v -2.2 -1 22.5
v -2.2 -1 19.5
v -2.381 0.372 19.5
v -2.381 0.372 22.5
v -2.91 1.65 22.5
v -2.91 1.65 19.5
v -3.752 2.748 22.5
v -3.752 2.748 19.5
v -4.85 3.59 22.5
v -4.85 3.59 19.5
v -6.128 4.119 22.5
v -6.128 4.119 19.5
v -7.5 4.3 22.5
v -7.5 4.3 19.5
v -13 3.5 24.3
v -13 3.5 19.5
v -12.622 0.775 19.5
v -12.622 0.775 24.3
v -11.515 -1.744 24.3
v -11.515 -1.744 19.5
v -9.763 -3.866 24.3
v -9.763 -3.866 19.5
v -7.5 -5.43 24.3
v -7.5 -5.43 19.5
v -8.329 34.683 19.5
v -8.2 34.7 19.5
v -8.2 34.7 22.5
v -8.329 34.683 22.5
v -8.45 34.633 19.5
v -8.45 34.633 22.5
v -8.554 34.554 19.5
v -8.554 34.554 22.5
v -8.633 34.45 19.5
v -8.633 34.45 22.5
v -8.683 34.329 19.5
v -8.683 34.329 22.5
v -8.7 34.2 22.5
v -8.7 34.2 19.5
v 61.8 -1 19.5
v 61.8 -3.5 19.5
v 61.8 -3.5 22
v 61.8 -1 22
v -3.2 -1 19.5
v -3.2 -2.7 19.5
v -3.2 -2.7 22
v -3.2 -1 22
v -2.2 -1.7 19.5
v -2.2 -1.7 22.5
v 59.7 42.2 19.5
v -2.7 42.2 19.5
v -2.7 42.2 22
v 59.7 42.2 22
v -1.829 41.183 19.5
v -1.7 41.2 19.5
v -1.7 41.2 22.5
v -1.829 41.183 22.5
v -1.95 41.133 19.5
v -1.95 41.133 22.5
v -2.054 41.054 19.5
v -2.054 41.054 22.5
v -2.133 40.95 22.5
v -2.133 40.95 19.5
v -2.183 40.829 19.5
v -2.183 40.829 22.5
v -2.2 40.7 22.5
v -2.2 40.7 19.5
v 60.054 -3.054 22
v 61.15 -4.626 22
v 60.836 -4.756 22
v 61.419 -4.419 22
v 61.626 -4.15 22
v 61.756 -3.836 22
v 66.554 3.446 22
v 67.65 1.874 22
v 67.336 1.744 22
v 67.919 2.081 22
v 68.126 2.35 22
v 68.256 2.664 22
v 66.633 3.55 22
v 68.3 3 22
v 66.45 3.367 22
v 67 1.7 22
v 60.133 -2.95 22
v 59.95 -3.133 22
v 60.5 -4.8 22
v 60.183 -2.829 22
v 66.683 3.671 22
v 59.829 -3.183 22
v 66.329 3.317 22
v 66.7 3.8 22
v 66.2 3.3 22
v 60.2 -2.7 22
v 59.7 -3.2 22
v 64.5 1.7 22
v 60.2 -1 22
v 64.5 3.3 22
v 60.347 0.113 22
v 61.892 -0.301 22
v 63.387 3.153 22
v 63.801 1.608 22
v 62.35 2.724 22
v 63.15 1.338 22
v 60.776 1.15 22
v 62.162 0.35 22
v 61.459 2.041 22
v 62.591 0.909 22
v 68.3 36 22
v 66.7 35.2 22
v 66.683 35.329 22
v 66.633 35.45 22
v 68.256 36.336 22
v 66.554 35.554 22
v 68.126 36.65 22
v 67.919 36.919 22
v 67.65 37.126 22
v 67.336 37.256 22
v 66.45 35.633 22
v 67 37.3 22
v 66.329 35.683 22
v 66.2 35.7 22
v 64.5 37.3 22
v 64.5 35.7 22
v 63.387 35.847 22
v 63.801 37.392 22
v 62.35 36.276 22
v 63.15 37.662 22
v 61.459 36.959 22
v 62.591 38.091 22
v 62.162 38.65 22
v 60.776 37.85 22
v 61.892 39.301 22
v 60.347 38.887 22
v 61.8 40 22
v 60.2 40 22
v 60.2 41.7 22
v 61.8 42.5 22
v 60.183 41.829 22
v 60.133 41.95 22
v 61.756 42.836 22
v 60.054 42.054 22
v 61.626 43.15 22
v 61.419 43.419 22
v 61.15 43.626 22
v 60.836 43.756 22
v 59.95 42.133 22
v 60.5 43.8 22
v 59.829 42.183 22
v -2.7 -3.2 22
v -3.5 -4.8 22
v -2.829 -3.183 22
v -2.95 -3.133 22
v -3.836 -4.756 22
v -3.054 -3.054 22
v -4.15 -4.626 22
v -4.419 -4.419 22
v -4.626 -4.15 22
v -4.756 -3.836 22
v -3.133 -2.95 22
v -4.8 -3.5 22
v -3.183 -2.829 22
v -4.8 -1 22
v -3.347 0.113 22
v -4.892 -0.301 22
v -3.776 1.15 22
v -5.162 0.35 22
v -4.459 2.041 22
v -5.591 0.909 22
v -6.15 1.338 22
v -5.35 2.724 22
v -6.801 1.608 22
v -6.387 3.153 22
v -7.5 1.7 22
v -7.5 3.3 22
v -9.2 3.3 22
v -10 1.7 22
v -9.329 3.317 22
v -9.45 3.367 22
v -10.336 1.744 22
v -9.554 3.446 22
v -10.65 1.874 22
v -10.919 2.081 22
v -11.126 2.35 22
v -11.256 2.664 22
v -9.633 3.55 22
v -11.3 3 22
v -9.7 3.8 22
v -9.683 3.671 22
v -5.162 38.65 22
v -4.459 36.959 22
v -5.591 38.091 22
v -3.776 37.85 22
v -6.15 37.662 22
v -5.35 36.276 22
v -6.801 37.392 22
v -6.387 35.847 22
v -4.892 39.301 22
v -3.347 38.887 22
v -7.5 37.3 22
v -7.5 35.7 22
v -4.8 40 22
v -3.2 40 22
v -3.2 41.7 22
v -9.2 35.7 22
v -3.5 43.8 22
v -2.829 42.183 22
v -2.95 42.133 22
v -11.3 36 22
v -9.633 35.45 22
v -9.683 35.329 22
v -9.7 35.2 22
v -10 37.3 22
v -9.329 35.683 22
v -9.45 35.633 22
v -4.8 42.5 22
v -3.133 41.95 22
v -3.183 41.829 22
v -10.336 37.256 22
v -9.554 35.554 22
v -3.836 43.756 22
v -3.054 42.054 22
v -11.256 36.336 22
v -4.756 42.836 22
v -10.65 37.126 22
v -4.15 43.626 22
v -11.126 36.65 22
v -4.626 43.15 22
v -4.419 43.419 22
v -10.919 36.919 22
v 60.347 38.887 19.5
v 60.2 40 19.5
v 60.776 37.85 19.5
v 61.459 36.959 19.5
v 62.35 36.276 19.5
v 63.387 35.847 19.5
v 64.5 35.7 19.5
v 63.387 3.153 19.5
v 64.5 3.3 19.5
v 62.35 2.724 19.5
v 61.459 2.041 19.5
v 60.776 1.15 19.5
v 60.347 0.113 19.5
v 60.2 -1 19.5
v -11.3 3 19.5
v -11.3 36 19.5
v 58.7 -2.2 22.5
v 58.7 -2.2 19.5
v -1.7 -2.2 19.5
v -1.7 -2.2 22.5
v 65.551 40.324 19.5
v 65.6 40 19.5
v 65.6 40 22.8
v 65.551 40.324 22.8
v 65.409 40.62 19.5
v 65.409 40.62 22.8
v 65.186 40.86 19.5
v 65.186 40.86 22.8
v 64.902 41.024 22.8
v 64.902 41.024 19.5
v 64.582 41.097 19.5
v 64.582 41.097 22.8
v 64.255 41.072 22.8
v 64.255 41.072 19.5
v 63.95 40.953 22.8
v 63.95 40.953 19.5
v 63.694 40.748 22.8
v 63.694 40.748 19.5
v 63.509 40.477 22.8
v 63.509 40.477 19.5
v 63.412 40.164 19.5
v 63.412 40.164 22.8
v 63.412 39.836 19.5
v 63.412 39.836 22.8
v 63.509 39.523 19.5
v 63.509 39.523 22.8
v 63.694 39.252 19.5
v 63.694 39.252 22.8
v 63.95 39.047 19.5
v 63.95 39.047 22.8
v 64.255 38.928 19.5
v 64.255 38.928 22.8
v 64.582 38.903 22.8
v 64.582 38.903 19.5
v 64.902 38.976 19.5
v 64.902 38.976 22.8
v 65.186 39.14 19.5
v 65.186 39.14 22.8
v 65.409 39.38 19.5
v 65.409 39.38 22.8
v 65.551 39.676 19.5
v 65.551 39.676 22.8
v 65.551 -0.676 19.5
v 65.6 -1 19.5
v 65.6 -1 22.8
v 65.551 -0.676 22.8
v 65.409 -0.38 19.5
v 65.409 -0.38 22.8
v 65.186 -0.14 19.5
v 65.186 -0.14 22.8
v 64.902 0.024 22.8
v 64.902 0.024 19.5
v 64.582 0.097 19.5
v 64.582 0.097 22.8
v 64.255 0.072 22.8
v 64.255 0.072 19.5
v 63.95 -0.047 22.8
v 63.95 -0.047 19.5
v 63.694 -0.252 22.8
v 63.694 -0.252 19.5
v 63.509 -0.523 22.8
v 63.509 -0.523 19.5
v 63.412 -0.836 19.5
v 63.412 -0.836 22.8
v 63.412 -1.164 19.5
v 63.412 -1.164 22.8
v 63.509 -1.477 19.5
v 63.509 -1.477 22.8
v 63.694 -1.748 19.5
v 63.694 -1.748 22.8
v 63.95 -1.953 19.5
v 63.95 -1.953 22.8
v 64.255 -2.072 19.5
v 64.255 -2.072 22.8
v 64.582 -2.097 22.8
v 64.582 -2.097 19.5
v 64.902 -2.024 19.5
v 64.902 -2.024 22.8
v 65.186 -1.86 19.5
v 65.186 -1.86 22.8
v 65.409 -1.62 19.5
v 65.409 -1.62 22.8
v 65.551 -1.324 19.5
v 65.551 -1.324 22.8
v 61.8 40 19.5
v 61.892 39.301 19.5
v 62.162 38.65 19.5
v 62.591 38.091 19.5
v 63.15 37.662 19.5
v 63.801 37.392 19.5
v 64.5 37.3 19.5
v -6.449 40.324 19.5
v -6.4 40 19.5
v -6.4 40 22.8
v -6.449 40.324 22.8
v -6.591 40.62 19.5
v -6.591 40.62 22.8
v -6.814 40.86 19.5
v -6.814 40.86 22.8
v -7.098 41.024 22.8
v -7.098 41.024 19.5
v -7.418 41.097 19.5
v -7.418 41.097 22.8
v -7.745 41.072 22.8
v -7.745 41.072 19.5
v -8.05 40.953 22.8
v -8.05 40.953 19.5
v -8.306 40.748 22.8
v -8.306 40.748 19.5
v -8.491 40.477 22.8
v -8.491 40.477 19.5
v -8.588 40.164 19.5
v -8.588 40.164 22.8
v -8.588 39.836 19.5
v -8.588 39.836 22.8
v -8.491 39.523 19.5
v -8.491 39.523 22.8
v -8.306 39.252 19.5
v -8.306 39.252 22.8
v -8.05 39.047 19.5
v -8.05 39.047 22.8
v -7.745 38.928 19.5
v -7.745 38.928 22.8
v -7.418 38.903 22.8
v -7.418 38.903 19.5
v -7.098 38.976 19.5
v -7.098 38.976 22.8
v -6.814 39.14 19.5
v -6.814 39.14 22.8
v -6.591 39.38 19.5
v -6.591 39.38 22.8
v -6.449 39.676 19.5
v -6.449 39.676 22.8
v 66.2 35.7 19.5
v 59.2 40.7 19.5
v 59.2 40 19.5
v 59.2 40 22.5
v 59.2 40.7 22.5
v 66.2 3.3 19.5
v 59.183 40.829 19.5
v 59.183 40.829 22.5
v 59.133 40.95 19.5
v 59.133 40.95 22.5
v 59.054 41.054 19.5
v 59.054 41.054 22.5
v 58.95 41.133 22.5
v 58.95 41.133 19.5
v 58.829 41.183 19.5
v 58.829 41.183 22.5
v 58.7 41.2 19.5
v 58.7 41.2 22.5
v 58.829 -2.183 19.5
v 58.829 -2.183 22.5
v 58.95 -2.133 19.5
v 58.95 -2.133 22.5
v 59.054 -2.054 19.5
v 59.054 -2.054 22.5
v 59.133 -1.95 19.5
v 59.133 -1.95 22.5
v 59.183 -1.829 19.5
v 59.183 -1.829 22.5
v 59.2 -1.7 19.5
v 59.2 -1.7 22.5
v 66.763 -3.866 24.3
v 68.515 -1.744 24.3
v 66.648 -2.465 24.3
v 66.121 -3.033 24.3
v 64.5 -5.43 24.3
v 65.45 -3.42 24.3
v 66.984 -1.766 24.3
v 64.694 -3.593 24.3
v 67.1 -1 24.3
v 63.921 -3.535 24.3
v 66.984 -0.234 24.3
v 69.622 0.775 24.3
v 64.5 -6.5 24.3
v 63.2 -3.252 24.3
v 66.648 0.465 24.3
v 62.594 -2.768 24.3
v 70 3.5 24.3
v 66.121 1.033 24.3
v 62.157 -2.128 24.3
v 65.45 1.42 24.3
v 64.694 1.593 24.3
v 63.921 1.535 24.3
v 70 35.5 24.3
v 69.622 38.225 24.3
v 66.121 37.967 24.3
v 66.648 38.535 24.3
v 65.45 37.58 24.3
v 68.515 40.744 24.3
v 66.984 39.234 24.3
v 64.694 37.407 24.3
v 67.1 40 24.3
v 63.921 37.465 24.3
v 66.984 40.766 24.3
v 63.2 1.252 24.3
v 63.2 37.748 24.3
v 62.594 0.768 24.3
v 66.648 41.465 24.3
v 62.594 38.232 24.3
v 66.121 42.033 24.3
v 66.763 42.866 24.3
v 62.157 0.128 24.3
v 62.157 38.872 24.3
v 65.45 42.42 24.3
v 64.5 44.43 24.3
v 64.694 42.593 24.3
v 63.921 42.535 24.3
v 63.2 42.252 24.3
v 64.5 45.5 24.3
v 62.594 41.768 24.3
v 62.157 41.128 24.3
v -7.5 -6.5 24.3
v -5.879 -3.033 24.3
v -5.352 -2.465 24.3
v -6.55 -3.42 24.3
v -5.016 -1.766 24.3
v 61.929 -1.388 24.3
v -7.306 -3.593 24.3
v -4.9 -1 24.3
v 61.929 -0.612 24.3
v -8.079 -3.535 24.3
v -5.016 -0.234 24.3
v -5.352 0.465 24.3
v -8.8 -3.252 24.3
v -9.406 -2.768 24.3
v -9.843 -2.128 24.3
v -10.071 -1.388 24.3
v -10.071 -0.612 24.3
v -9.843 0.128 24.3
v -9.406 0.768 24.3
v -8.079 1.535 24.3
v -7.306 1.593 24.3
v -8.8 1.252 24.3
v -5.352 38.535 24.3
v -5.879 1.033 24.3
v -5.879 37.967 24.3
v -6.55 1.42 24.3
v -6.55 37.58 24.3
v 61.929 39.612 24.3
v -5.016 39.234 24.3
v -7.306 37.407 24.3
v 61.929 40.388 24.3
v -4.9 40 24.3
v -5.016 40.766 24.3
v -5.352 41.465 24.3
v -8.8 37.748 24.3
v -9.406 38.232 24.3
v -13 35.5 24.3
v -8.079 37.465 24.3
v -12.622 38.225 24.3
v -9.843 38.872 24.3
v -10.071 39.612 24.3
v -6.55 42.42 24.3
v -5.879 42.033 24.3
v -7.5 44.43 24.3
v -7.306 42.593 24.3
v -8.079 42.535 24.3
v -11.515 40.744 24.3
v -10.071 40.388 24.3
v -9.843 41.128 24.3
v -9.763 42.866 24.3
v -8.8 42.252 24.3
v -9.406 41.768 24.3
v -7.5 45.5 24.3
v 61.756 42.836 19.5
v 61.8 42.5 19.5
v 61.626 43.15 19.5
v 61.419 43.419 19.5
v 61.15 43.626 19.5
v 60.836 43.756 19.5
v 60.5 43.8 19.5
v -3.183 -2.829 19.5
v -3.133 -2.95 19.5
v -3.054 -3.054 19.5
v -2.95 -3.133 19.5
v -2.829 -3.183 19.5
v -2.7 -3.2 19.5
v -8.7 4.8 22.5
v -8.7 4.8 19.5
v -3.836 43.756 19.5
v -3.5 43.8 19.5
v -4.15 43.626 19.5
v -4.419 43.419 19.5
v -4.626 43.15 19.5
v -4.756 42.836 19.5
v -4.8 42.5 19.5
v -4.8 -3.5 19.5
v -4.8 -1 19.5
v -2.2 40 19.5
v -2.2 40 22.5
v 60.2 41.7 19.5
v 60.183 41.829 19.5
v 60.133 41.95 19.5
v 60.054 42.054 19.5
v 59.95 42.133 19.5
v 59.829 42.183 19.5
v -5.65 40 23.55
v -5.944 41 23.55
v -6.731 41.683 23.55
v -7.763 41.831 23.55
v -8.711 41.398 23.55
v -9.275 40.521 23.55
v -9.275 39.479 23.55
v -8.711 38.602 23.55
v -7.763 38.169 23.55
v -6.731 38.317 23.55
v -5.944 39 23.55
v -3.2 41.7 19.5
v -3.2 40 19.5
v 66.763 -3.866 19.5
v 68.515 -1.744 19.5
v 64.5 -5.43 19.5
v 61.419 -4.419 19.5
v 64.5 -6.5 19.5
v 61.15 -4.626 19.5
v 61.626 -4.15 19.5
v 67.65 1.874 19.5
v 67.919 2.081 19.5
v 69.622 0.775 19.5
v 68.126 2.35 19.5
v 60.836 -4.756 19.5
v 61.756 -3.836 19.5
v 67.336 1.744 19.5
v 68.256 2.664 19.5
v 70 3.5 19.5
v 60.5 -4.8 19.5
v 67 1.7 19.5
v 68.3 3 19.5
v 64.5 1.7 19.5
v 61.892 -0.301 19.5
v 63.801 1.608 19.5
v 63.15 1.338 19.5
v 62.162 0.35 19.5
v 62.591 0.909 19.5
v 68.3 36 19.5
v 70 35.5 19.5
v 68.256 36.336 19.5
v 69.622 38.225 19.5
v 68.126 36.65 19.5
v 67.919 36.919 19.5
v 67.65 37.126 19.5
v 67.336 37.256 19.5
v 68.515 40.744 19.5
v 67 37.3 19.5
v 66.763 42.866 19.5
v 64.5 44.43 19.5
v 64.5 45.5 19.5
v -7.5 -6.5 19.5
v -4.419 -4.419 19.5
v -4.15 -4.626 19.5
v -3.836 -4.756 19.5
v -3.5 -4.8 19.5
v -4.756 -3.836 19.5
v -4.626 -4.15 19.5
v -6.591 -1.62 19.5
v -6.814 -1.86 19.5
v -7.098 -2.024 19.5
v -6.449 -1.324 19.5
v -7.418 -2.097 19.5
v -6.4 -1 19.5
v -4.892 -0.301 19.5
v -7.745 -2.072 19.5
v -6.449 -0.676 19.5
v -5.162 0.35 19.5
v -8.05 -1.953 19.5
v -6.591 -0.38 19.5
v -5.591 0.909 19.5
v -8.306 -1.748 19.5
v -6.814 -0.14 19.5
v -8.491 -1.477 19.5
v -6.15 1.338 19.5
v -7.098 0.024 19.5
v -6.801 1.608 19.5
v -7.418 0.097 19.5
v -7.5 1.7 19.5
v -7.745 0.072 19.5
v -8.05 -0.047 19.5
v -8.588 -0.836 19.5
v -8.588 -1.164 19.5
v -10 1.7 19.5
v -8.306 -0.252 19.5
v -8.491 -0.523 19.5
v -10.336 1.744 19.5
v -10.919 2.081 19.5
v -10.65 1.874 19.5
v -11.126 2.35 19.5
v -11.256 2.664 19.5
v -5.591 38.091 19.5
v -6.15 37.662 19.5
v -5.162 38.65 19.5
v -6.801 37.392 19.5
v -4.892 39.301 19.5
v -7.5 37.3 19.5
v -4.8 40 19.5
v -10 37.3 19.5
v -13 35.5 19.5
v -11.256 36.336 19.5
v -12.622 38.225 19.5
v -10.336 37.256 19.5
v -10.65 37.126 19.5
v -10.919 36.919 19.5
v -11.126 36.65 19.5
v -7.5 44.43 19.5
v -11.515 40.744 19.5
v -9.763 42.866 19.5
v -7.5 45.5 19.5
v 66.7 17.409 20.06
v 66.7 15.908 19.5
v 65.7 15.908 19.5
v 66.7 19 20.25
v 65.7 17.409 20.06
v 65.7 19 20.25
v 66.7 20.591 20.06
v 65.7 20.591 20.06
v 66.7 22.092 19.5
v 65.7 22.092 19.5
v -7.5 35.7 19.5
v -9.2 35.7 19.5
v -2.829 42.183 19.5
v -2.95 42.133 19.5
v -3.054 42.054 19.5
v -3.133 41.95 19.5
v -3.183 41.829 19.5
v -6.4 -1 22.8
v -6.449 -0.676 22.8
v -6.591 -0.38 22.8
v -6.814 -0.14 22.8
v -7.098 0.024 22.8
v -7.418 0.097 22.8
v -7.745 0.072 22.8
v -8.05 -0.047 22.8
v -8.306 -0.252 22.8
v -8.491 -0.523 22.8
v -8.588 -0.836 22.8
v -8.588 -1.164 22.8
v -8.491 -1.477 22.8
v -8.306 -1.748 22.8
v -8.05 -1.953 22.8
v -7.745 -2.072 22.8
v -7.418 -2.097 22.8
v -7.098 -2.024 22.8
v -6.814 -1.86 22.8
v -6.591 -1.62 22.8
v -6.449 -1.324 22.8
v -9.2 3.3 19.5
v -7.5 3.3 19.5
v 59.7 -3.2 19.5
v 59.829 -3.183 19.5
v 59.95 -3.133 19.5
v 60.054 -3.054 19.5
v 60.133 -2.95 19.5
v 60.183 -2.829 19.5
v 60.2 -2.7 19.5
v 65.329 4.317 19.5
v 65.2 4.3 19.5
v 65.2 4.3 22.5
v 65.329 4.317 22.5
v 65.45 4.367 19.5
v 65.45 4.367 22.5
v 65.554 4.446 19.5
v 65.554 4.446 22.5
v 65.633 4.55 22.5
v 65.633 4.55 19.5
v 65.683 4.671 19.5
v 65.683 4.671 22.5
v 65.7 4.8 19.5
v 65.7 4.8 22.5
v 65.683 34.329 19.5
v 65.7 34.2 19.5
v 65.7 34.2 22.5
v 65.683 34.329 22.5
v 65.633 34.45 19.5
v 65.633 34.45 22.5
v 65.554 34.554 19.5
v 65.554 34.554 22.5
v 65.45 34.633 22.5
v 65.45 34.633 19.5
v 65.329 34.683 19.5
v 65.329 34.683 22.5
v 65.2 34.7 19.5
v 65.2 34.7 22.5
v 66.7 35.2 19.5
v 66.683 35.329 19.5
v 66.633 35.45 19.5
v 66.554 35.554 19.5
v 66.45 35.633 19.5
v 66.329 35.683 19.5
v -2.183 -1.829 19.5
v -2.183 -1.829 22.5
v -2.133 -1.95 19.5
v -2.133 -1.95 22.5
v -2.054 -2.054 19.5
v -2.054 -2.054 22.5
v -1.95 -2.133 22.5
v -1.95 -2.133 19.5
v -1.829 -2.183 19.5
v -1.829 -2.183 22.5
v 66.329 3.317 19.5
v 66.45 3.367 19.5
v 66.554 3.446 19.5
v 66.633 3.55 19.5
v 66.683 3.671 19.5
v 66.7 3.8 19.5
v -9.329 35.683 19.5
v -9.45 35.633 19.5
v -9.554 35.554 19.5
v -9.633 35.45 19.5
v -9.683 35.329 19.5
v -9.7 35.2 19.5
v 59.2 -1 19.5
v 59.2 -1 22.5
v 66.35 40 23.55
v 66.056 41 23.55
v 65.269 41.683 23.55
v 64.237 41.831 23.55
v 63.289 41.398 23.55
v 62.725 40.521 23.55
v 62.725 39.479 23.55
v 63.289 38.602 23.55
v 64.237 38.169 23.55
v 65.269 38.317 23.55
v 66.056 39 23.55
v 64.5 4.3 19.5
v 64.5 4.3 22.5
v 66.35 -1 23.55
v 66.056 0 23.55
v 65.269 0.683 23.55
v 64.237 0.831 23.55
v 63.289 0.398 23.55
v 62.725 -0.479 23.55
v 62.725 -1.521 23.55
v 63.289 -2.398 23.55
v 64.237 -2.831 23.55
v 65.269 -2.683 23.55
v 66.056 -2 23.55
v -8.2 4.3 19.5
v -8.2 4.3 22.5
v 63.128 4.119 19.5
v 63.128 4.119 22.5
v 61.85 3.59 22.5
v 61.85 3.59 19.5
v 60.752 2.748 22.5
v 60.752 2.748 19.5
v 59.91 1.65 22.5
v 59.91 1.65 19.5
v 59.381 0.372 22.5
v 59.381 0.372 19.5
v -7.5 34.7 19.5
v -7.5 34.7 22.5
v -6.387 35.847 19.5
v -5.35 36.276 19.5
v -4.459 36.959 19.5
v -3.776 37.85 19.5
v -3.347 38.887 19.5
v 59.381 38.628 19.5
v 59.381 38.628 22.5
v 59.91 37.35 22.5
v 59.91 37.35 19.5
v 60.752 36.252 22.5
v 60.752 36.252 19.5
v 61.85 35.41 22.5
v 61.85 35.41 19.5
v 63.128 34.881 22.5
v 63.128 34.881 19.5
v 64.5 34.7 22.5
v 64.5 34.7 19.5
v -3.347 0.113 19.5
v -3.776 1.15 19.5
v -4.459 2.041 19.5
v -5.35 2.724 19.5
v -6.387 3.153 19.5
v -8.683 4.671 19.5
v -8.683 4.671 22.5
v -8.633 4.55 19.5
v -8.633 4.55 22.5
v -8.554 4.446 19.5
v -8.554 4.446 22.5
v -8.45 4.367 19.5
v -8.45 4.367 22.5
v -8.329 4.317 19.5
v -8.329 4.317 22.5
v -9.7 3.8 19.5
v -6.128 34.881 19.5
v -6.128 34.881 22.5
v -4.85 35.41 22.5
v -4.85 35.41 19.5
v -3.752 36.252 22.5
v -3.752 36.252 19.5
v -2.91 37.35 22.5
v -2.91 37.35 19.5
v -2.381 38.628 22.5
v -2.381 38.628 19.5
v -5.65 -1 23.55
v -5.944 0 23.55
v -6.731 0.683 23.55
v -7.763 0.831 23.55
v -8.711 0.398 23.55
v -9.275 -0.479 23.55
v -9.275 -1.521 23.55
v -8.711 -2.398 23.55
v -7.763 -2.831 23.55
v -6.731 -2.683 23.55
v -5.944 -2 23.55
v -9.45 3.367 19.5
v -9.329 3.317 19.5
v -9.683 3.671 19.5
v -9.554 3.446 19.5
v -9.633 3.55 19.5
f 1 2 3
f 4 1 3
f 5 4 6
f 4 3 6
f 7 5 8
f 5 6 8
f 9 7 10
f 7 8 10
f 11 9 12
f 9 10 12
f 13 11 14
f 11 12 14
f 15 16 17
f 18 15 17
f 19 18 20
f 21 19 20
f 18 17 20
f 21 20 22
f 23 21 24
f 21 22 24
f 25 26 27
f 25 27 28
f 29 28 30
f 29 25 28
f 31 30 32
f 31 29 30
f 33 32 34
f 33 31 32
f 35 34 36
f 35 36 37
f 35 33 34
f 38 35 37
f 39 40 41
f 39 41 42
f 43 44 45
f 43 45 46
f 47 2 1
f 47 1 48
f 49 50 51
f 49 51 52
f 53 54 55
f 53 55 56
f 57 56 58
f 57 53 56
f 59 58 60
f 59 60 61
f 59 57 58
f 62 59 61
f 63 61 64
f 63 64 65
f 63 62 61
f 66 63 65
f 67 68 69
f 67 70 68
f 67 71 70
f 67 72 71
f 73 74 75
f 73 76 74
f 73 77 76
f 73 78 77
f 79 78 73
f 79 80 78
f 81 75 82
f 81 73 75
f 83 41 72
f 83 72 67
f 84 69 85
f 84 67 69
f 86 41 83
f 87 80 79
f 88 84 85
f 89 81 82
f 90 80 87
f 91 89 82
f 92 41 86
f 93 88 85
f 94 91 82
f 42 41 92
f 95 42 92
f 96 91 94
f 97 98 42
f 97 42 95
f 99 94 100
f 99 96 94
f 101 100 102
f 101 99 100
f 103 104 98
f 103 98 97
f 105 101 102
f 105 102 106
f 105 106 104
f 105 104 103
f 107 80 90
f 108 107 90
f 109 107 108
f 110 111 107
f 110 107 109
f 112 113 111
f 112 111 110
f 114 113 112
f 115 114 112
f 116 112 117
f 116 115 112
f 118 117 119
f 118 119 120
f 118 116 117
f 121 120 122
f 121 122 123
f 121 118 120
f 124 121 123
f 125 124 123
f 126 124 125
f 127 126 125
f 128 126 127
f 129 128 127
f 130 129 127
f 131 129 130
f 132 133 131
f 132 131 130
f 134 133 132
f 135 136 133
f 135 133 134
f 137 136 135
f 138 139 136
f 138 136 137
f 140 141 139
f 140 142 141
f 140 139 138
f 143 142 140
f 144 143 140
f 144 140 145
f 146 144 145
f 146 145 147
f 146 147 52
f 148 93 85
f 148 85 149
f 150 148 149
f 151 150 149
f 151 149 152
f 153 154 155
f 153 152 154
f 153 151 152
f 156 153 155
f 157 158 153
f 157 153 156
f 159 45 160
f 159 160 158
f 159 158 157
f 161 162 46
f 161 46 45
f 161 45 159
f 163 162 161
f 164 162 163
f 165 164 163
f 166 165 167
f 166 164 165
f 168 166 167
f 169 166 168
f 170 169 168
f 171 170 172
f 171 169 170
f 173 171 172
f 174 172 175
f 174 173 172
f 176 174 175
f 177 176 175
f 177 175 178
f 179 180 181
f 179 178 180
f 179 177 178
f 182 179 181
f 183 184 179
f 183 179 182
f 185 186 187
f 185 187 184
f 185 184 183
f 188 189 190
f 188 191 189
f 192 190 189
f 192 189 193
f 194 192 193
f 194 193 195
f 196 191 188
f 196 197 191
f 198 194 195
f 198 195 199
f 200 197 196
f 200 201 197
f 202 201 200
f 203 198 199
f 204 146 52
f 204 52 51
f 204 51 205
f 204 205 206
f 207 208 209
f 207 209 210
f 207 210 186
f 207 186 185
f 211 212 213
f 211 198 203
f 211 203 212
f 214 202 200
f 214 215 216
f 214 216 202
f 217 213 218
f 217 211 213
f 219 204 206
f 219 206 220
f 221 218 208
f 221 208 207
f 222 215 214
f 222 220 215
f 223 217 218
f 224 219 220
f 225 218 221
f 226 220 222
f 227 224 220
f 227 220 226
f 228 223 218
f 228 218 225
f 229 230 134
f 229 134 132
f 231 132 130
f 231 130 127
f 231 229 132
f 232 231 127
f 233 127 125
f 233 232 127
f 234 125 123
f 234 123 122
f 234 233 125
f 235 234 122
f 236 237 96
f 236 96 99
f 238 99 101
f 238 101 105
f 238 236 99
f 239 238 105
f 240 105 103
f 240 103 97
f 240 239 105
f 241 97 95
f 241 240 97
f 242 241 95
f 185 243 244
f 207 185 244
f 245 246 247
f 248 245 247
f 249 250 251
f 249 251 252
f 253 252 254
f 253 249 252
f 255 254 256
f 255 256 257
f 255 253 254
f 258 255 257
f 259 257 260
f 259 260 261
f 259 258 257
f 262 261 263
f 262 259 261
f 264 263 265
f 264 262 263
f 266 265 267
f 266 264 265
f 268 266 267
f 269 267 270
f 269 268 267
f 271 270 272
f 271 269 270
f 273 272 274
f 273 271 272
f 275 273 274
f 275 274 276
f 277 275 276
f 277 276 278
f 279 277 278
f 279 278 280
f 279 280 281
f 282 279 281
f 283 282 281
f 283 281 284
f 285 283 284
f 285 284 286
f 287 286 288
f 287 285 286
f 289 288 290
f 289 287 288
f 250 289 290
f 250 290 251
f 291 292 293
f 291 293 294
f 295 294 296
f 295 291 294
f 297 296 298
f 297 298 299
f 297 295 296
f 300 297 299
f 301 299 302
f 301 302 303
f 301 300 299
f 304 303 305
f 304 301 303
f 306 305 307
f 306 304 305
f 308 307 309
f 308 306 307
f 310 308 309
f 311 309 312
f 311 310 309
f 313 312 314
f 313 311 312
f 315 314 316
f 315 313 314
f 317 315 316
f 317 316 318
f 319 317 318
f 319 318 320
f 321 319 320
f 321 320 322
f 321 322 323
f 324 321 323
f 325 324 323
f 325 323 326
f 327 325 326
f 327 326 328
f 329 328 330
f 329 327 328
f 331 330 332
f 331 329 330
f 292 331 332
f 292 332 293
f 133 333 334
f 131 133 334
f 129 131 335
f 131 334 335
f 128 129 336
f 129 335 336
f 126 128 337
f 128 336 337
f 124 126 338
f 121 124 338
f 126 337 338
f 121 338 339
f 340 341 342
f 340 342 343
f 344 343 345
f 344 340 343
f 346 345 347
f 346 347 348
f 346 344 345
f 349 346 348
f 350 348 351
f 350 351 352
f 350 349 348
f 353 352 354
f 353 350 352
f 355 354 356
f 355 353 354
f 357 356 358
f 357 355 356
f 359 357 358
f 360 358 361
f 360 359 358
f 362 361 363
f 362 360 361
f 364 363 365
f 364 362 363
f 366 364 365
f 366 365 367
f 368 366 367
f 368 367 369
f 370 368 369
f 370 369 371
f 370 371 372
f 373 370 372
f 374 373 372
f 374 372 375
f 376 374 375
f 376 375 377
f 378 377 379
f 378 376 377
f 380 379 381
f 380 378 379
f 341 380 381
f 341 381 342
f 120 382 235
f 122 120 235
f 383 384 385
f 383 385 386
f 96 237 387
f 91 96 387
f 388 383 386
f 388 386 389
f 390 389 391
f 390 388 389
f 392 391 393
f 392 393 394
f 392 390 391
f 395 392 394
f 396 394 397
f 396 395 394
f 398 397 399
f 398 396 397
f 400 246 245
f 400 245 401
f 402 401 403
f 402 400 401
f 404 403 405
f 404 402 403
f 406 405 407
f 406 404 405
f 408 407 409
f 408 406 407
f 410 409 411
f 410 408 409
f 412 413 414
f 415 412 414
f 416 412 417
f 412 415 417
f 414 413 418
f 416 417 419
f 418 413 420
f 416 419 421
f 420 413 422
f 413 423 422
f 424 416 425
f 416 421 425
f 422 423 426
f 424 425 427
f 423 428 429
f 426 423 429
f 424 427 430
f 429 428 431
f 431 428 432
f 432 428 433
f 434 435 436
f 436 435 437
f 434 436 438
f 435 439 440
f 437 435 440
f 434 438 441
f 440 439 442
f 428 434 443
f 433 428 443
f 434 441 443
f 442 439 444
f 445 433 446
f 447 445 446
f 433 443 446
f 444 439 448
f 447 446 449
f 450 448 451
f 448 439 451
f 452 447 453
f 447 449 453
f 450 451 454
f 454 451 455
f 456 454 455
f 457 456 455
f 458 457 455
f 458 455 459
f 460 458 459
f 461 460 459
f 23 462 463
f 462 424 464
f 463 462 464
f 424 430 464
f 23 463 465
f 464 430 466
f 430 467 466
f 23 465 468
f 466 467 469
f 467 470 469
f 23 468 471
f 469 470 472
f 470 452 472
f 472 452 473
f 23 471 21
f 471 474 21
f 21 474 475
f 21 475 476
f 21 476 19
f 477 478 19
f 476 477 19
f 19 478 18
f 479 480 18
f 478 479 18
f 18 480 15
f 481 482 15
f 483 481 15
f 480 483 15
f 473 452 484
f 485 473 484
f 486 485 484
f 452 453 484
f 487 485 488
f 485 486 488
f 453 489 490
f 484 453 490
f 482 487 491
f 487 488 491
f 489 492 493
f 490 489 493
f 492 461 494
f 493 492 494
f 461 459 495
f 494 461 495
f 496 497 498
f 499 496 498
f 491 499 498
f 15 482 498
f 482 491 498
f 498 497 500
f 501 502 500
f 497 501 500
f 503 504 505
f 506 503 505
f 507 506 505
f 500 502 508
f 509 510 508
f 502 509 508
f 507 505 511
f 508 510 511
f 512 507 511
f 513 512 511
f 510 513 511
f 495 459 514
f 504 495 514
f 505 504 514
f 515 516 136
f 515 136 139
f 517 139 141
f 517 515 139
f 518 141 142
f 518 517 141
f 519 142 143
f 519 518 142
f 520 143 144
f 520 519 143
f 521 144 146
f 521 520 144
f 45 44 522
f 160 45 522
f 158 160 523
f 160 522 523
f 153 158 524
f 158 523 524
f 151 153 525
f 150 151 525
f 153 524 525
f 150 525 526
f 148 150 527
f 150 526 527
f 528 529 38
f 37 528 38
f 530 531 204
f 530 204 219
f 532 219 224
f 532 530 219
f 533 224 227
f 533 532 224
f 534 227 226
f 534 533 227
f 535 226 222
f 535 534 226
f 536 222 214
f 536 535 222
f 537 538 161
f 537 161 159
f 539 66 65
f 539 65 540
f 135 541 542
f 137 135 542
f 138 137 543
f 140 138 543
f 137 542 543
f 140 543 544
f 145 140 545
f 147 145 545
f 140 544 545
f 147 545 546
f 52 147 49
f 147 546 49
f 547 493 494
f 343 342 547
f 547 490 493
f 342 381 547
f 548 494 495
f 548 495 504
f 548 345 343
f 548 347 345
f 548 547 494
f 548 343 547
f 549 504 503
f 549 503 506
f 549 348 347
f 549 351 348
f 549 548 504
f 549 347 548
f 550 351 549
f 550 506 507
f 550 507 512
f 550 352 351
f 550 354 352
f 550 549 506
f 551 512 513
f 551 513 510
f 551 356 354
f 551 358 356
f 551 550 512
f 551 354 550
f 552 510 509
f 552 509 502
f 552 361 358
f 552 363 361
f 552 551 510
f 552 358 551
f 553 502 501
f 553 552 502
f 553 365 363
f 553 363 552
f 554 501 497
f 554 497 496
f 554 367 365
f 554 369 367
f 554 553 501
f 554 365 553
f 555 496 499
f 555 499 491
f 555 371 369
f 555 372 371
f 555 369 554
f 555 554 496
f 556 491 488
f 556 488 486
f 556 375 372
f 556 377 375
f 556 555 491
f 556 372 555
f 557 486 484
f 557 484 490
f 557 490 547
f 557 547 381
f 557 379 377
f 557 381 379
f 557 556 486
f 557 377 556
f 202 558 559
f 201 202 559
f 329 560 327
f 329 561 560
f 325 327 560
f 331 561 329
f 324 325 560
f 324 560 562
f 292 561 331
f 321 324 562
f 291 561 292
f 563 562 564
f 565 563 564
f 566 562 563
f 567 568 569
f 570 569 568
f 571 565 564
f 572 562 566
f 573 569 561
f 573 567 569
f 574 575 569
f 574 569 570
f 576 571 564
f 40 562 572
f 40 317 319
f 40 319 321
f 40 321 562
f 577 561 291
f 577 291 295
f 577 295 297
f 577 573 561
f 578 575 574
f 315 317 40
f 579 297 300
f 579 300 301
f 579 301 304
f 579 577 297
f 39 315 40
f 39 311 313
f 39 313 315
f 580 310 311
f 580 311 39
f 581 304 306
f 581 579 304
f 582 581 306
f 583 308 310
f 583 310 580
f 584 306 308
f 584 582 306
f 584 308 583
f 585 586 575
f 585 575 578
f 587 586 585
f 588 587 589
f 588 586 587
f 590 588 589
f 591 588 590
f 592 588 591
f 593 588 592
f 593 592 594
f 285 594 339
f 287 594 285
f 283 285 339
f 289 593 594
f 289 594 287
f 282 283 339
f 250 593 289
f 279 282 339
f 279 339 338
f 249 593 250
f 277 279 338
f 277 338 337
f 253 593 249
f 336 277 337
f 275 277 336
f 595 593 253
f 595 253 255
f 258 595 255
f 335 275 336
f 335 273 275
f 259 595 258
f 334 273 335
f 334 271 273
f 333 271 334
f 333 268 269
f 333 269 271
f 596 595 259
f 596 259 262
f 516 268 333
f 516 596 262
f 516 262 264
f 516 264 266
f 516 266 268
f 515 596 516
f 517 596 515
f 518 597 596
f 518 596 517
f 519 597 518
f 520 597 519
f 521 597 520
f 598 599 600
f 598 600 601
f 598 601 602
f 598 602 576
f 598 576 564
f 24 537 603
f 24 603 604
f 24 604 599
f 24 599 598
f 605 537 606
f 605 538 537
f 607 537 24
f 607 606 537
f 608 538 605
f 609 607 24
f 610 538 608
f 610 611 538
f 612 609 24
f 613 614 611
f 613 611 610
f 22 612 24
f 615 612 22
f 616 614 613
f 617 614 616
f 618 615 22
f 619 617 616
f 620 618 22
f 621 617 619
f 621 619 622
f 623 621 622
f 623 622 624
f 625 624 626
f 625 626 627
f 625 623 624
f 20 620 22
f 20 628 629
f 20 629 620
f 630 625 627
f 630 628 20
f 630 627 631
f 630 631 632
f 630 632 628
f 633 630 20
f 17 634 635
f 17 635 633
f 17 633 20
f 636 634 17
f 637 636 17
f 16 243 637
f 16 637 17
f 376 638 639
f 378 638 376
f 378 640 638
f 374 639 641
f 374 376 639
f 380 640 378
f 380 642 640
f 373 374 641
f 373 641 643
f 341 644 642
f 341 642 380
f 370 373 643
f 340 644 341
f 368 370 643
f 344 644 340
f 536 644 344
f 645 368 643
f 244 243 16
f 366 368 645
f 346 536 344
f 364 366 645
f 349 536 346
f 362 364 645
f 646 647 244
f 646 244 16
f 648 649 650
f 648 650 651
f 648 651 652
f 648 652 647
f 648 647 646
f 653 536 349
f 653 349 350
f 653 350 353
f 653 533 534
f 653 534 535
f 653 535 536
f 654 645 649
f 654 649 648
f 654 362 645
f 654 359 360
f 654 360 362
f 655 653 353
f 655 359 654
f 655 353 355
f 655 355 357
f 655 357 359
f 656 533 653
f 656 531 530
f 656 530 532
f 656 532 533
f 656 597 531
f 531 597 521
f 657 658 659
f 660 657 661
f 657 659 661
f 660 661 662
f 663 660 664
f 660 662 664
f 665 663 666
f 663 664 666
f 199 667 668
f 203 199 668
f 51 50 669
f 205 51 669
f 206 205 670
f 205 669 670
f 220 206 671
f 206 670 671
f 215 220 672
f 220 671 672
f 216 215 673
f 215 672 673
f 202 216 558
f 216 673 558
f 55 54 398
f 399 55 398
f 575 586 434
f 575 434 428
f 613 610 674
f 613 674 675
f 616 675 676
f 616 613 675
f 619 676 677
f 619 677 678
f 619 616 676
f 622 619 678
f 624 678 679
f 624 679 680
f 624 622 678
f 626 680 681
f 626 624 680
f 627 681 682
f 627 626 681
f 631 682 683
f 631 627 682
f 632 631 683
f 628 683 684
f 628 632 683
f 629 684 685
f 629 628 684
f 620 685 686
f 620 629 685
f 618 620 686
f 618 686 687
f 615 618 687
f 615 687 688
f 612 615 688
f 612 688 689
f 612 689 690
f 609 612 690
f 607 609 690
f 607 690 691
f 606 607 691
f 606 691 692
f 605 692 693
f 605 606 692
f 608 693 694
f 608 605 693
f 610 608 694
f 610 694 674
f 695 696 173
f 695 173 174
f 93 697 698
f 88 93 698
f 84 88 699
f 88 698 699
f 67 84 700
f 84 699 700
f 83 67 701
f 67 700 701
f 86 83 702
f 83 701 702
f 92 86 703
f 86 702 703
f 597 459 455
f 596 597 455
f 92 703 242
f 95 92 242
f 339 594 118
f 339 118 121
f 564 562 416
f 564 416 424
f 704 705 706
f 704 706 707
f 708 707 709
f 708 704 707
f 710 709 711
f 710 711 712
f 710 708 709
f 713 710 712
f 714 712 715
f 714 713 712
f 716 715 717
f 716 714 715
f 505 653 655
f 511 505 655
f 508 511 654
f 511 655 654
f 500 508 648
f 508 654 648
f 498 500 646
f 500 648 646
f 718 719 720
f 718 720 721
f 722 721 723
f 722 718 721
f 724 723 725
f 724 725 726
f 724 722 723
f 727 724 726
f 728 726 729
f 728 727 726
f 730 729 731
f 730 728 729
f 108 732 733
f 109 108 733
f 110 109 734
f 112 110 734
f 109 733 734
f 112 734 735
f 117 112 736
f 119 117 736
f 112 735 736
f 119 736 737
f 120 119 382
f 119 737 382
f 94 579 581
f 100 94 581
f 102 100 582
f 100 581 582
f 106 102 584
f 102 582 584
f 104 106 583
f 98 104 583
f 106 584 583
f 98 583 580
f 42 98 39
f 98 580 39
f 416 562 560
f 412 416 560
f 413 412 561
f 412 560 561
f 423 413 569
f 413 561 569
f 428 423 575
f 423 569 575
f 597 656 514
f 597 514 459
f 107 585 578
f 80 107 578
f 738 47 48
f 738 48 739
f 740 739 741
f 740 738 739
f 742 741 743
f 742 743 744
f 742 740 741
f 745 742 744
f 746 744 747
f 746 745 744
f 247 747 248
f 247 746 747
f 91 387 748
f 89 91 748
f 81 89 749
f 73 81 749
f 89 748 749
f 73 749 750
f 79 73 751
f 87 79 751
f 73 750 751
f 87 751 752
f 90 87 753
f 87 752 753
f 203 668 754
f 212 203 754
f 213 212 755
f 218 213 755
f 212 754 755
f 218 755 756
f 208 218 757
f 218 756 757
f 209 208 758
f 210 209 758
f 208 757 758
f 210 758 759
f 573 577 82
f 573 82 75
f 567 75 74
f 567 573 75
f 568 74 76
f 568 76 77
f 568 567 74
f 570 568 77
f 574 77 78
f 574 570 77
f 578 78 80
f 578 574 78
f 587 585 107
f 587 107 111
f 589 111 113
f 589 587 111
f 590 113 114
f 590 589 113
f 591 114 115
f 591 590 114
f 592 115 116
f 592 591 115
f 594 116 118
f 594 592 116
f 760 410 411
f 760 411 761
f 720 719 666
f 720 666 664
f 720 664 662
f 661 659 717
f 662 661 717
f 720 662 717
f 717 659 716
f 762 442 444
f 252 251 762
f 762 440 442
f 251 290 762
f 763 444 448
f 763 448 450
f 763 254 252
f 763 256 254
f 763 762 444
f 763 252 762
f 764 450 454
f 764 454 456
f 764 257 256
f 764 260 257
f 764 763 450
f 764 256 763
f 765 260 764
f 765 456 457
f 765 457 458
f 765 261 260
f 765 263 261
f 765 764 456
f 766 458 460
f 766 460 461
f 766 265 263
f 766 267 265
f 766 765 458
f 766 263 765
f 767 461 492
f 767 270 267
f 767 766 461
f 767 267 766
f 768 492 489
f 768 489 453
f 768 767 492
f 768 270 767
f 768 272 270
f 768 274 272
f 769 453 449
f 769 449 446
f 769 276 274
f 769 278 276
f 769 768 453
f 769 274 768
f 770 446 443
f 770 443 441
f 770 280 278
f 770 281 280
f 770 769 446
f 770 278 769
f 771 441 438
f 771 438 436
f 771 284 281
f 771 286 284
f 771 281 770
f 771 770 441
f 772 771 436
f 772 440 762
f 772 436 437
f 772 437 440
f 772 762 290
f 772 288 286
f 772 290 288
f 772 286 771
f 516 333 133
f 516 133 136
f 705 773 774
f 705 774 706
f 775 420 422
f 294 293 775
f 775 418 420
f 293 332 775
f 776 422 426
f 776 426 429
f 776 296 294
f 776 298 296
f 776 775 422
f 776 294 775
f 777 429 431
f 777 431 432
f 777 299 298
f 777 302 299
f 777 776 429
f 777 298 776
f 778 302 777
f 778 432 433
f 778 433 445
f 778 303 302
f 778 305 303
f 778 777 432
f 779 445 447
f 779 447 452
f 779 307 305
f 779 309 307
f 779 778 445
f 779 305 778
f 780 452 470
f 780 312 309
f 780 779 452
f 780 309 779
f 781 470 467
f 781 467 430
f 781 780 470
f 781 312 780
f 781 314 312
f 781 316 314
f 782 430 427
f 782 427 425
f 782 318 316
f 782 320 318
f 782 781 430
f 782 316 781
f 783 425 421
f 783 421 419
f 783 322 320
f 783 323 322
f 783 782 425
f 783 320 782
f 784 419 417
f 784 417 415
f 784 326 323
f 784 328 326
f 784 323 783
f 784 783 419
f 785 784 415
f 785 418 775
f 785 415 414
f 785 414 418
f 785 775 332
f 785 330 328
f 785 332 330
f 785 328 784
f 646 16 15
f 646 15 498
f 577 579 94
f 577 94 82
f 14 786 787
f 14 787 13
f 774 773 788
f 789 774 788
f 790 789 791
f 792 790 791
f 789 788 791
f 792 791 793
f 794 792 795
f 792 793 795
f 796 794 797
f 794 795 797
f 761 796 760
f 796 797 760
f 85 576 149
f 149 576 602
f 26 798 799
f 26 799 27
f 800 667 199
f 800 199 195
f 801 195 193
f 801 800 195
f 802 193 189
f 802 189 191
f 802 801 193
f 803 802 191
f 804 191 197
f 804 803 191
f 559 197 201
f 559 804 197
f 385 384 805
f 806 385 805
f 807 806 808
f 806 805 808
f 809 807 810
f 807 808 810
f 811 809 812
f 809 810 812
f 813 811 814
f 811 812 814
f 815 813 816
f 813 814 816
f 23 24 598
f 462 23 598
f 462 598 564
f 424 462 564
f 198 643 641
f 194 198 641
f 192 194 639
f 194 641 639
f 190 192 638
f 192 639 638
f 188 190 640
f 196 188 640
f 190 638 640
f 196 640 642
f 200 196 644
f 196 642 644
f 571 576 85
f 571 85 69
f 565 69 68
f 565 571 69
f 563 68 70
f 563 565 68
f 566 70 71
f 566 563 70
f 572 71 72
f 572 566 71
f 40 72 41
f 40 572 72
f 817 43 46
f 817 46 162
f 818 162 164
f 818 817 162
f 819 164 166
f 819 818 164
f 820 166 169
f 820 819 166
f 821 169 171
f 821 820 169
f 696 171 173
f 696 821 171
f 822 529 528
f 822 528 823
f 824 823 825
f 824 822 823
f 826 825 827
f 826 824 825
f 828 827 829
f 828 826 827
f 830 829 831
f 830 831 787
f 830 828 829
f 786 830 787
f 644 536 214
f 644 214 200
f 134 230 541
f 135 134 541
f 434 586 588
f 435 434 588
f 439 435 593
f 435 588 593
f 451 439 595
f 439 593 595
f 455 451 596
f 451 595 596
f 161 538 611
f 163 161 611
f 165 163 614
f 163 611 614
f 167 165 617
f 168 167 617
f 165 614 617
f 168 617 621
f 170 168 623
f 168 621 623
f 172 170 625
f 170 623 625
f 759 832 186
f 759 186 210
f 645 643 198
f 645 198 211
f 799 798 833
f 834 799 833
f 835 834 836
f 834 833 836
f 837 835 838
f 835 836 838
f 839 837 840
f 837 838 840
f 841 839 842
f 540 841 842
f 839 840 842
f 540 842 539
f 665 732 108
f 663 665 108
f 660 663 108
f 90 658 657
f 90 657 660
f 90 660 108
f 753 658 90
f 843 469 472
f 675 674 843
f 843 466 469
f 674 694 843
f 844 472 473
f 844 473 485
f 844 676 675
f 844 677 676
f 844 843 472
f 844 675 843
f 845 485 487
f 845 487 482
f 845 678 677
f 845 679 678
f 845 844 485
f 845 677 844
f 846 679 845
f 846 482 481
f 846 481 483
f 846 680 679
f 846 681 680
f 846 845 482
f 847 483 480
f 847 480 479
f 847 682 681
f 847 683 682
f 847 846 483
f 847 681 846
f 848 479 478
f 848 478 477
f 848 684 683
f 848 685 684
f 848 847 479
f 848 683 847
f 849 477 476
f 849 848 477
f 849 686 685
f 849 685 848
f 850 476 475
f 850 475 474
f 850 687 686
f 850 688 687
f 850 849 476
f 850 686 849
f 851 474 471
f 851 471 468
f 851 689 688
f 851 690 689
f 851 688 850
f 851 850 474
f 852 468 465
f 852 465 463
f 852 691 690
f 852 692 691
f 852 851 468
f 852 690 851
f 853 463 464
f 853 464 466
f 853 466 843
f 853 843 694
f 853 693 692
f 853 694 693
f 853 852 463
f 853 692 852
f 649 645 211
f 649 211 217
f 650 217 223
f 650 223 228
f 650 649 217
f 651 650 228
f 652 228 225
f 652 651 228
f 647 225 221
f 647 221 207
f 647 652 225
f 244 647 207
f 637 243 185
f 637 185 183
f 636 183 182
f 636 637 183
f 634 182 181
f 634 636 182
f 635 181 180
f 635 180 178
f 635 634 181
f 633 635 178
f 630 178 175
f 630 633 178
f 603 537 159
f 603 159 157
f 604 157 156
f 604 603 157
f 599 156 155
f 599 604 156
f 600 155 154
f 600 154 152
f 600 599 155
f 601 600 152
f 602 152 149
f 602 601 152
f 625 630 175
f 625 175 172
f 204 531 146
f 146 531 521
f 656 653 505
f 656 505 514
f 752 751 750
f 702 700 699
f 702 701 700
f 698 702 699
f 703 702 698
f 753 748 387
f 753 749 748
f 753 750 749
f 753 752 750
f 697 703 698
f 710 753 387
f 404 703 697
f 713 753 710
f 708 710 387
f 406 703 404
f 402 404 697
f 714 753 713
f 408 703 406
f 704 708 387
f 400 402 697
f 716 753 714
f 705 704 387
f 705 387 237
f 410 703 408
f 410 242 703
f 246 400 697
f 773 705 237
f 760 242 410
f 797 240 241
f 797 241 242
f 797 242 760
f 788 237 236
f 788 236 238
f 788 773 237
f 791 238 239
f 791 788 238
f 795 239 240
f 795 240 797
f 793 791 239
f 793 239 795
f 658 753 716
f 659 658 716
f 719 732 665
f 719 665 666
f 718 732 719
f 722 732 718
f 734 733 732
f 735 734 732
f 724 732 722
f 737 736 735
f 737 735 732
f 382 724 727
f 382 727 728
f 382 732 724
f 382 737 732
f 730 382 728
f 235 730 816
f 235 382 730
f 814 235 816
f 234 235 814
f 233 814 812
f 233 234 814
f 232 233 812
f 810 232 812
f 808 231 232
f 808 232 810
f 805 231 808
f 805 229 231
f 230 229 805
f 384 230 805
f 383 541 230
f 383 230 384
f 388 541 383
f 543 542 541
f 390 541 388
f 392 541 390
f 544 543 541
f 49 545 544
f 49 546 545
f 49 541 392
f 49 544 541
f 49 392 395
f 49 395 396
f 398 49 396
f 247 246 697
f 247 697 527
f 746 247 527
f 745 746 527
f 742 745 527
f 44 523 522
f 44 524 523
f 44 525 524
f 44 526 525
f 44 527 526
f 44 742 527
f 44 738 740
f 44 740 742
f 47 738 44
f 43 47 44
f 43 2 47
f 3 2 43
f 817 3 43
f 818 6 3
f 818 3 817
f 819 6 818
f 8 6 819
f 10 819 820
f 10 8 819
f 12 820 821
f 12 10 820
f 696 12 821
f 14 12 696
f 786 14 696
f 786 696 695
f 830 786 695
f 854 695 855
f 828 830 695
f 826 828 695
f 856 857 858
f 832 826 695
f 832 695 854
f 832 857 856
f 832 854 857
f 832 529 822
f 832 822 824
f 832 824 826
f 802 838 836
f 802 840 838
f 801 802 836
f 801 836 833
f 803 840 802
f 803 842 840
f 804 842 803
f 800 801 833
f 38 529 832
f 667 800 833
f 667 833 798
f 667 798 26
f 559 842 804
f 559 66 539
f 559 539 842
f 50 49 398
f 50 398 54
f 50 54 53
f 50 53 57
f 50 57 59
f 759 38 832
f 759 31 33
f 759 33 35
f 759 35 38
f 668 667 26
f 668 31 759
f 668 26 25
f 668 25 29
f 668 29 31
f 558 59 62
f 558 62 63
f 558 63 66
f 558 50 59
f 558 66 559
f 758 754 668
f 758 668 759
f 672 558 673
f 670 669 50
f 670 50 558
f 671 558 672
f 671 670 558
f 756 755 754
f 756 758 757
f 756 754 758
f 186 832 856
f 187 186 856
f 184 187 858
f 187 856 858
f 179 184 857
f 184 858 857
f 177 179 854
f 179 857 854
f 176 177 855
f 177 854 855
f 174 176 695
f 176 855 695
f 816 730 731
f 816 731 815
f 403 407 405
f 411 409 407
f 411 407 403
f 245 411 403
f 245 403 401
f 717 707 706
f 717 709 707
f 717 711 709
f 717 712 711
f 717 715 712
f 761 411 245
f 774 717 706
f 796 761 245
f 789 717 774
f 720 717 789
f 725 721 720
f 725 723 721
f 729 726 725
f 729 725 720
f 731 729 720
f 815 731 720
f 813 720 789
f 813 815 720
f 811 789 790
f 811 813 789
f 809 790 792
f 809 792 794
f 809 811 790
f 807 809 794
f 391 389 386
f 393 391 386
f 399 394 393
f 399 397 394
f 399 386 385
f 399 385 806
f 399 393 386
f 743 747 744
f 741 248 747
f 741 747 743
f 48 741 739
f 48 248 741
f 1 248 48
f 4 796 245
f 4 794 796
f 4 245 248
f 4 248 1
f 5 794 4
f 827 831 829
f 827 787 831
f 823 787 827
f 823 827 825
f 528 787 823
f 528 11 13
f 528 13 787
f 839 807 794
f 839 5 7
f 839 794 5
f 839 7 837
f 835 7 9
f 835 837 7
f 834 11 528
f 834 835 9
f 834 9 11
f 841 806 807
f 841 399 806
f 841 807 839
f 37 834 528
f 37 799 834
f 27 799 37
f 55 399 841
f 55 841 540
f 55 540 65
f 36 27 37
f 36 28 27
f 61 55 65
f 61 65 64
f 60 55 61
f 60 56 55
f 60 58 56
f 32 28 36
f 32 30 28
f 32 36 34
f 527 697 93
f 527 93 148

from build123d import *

# Parameters (mm, degrees)
SKETCH033_R     = 1.1
PAD017_DEPTH    = 4.8
POCKET009_DEPTH = 2.5
POCKET010_DEPTH = 3
CHAMFER011_SIZE = 1.5
SKETCH040_R     = 6.75
POCKET014_DEPTH = 2


with BuildPart() as part:
    # Sketch033 → Pad017 (new body)
    with BuildSketch(Plane.XY):
        with BuildLine():
            Line((0, 10), (0, 42))
            ThreePointArc((5.5, 50.930286), (1.485307, 47.244044), (0, 42))
            Line((5.5, 50.930286), (5.5, 52))
            Line((5.5, 52), (77.5, 52))
            Line((77.5, 52), (77.5, 50.930286))
            ThreePointArc((83, 42), (81.514693, 47.244044), (77.5, 50.930286))
            Line((83, 42), (83, 10))
            ThreePointArc((77.5, 1.069714), (81.514693, 4.755956), (83, 10))
            Line((77.5, 1.069714), (77.5, 0))
            Line((5.5, 0), (77.5, 0))
            Line((5.5, 1.069714), (5.5, 0))
            ThreePointArc((0, 10), (1.485307, 4.755956), (5.5, 1.069714))
        make_face()
        with Locations((5.5, 46.5)):
            Circle(SKETCH033_R, mode=Mode.SUBTRACT)
        with Locations((77.5, 46.5)):
            Circle(SKETCH033_R, mode=Mode.SUBTRACT)
        with Locations((5.5, 5.5)):
            Circle(SKETCH033_R, mode=Mode.SUBTRACT)
        with Locations((77.5, 5.5)):
            Circle(SKETCH033_R, mode=Mode.SUBTRACT)
    extrude(amount=PAD017_DEPTH)

    # Sketch034 → Pocket009 (cut)
    with BuildSketch(Plane.XY):
        with BuildLine():
            Line((9.5, 50.3), (73.5, 50.3))
            ThreePointArc((74.8, 49), (74.419239, 49.919239), (73.5, 50.3))
            Line((74.8, 46.5), (74.8, 49))
            ThreePointArc((74.8, 46.5), (75.590812, 44.590812), (77.5, 43.8))
            Line((80, 43.8), (77.5, 43.8))
            ThreePointArc((81.3, 42.5), (80.919239, 43.419239), (80, 43.8))
            Line((81.3, 42.5), (81.3, 9.5))
            ThreePointArc((80, 8.2), (80.919239, 8.580761), (81.3, 9.5))
            Line((77.5, 8.2), (80, 8.2))
            ThreePointArc((77.5, 8.2), (75.590812, 7.409188), (74.8, 5.5))
            Line((74.8, 3), (74.8, 5.5))
            ThreePointArc((73.5, 1.7), (74.419239, 2.080761), (74.8, 3))
            Line((73.5, 1.7), (9.5, 1.7))
            ThreePointArc((8.2, 3), (8.580761, 2.080761), (9.5, 1.7))
            Line((8.2, 5.5), (8.2, 3))
            ThreePointArc((8.2, 5.5), (7.409188, 7.409188), (5.5, 8.2))
            Line((3, 8.2), (5.5, 8.2))
            ThreePointArc((1.7, 9.5), (2.080761, 8.580761), (3, 8.2))
            Line((1.7, 9.5), (1.7, 42.5))
            ThreePointArc((3, 43.8), (2.080761, 43.419239), (1.7, 42.5))
            Line((5.5, 43.8), (3, 43.8))
            ThreePointArc((5.5, 43.8), (7.409188, 44.590812), (8.2, 46.5))
            Line((8.2, 49), (8.2, 46.5))
            ThreePointArc((9.5, 50.3), (8.580761, 49.919239), (8.2, 49))
        make_face()
        with BuildLine():
            Line((10.3, 48.7), (72.7, 48.7))
            ThreePointArc((73.2, 48.2), (73.053553, 48.553553), (72.7, 48.7))
            Line((73.2, 46.5), (73.2, 48.2))
            ThreePointArc((73.2, 46.5), (74.459441, 43.459441), (77.5, 42.2))
            Line((79.2, 42.2), (77.5, 42.2))
            ThreePointArc((79.7, 41.7), (79.553553, 42.053553), (79.2, 42.2))
            Line((79.7, 41.7), (79.7, 10.3))
            ThreePointArc((79.2, 9.8), (79.553553, 9.946447), (79.7, 10.3))
            Line((77.5, 9.8), (79.2, 9.8))
            ThreePointArc((77.5, 9.8), (74.459441, 8.540559), (73.2, 5.5))
            Line((73.2, 3.8), (73.2, 5.5))
            ThreePointArc((72.7, 3.3), (73.053553, 3.446447), (73.2, 3.8))
            Line((72.7, 3.3), (10.3, 3.3))
            ThreePointArc((9.8, 3.8), (9.946447, 3.446447), (10.3, 3.3))
            Line((9.8, 3.8), (9.8, 5.5))
            ThreePointArc((9.8, 5.5), (8.540559, 8.540559), (5.5, 9.8))
            Line((5.5, 9.8), (3.8, 9.8))
            ThreePointArc((3.3, 10.3), (3.446447, 9.946447), (3.8, 9.8))
            Line((3.3, 10.3), (3.3, 41.7))
            ThreePointArc((3.8, 42.2), (3.446447, 42.053553), (3.3, 41.7))
            Line((5.5, 42.2), (3.8, 42.2))
            ThreePointArc((5.5, 42.2), (8.540559, 43.459441), (9.8, 46.5))
            Line((9.8, 48.2), (9.8, 46.5))
            ThreePointArc((10.3, 48.7), (9.946447, 48.553553), (9.8, 48.2))
        make_face(mode=Mode.SUBTRACT)
    extrude(amount=POCKET009_DEPTH, mode=Mode.SUBTRACT)

    # Sketch035 → Pocket010 (cut)
    with BuildSketch(Plane.XY):
        with BuildLine():
            Line((11.3, 47.7), (71.7, 47.7))
            ThreePointArc((72.2, 47.2), (72.053553, 47.553553), (71.7, 47.7))
            Line((72.2, 46.5), (72.2, 47.2))
            ThreePointArc((72.2, 46.5), (73.752334, 42.752334), (77.5, 41.2))
            Line((78.2, 41.2), (77.5, 41.2))
            ThreePointArc((78.7, 40.7), (78.553553, 41.053553), (78.2, 41.2))
            Line((78.7, 40.7), (78.7, 11.3))
            ThreePointArc((78.2, 10.8), (78.553553, 10.946447), (78.7, 11.3))
            Line((77.5, 10.8), (78.2, 10.8))
            ThreePointArc((77.5, 10.8), (73.752334, 9.247666), (72.2, 5.5))
            Line((72.2, 4.8), (72.2, 5.5))
            ThreePointArc((71.7, 4.3), (72.053553, 4.446447), (72.2, 4.8))
            Line((71.7, 4.3), (11.3, 4.3))
            ThreePointArc((10.8, 4.8), (10.946447, 4.446447), (11.3, 4.3))
            Line((10.8, 5.5), (10.8, 4.8))
            ThreePointArc((10.8, 5.5), (9.247666, 9.247666), (5.5, 10.8))
            Line((4.8, 10.8), (5.5, 10.8))
            ThreePointArc((4.3, 11.3), (4.446447, 10.946447), (4.8, 10.8))
            Line((4.3, 11.3), (4.3, 40.7))
            ThreePointArc((4.8, 41.2), (4.446447, 41.053553), (4.3, 40.7))
            Line((5.5, 41.2), (4.8, 41.2))
            ThreePointArc((5.5, 41.2), (9.247666, 42.752334), (10.8, 46.5))
            Line((10.8, 47.2), (10.8, 46.5))
            ThreePointArc((11.3, 47.7), (10.946447, 47.553553), (10.8, 47.2))
        make_face()
    extrude(amount=POCKET010_DEPTH, mode=Mode.SUBTRACT)

    # Chamfer011
    chamfer011_edges = [part.edges().sort_by_distance(p)[0] for p in [
        (76.4, 46.5, 4.8),
        (76.4, 5.5, 4.8),
        (4.4, 5.5, 4.8),
        (4.4, 46.5, 4.8),
    ]]
    chamfer(chamfer011_edges, length=CHAMFER011_SIZE)

    # Sketch040 (on Face79 of Chamfer011) → Pocket014 (cut)
    with BuildSketch(Plane(origin=(78.7, 0, 0), x_dir=(0, -1, 0), z_dir=(-1, 0, 0))):
        with Locations((-25.5, -6)):
            Circle(SKETCH040_R)
    extrude(amount=-POCKET014_DEPTH, mode=Mode.SUBTRACT)


with BuildPart() as part_1:
    # Body009 placement: moved
    add(part.part.moved(Location((-13, -6.5, 19.5))))


solid = part_1.part
